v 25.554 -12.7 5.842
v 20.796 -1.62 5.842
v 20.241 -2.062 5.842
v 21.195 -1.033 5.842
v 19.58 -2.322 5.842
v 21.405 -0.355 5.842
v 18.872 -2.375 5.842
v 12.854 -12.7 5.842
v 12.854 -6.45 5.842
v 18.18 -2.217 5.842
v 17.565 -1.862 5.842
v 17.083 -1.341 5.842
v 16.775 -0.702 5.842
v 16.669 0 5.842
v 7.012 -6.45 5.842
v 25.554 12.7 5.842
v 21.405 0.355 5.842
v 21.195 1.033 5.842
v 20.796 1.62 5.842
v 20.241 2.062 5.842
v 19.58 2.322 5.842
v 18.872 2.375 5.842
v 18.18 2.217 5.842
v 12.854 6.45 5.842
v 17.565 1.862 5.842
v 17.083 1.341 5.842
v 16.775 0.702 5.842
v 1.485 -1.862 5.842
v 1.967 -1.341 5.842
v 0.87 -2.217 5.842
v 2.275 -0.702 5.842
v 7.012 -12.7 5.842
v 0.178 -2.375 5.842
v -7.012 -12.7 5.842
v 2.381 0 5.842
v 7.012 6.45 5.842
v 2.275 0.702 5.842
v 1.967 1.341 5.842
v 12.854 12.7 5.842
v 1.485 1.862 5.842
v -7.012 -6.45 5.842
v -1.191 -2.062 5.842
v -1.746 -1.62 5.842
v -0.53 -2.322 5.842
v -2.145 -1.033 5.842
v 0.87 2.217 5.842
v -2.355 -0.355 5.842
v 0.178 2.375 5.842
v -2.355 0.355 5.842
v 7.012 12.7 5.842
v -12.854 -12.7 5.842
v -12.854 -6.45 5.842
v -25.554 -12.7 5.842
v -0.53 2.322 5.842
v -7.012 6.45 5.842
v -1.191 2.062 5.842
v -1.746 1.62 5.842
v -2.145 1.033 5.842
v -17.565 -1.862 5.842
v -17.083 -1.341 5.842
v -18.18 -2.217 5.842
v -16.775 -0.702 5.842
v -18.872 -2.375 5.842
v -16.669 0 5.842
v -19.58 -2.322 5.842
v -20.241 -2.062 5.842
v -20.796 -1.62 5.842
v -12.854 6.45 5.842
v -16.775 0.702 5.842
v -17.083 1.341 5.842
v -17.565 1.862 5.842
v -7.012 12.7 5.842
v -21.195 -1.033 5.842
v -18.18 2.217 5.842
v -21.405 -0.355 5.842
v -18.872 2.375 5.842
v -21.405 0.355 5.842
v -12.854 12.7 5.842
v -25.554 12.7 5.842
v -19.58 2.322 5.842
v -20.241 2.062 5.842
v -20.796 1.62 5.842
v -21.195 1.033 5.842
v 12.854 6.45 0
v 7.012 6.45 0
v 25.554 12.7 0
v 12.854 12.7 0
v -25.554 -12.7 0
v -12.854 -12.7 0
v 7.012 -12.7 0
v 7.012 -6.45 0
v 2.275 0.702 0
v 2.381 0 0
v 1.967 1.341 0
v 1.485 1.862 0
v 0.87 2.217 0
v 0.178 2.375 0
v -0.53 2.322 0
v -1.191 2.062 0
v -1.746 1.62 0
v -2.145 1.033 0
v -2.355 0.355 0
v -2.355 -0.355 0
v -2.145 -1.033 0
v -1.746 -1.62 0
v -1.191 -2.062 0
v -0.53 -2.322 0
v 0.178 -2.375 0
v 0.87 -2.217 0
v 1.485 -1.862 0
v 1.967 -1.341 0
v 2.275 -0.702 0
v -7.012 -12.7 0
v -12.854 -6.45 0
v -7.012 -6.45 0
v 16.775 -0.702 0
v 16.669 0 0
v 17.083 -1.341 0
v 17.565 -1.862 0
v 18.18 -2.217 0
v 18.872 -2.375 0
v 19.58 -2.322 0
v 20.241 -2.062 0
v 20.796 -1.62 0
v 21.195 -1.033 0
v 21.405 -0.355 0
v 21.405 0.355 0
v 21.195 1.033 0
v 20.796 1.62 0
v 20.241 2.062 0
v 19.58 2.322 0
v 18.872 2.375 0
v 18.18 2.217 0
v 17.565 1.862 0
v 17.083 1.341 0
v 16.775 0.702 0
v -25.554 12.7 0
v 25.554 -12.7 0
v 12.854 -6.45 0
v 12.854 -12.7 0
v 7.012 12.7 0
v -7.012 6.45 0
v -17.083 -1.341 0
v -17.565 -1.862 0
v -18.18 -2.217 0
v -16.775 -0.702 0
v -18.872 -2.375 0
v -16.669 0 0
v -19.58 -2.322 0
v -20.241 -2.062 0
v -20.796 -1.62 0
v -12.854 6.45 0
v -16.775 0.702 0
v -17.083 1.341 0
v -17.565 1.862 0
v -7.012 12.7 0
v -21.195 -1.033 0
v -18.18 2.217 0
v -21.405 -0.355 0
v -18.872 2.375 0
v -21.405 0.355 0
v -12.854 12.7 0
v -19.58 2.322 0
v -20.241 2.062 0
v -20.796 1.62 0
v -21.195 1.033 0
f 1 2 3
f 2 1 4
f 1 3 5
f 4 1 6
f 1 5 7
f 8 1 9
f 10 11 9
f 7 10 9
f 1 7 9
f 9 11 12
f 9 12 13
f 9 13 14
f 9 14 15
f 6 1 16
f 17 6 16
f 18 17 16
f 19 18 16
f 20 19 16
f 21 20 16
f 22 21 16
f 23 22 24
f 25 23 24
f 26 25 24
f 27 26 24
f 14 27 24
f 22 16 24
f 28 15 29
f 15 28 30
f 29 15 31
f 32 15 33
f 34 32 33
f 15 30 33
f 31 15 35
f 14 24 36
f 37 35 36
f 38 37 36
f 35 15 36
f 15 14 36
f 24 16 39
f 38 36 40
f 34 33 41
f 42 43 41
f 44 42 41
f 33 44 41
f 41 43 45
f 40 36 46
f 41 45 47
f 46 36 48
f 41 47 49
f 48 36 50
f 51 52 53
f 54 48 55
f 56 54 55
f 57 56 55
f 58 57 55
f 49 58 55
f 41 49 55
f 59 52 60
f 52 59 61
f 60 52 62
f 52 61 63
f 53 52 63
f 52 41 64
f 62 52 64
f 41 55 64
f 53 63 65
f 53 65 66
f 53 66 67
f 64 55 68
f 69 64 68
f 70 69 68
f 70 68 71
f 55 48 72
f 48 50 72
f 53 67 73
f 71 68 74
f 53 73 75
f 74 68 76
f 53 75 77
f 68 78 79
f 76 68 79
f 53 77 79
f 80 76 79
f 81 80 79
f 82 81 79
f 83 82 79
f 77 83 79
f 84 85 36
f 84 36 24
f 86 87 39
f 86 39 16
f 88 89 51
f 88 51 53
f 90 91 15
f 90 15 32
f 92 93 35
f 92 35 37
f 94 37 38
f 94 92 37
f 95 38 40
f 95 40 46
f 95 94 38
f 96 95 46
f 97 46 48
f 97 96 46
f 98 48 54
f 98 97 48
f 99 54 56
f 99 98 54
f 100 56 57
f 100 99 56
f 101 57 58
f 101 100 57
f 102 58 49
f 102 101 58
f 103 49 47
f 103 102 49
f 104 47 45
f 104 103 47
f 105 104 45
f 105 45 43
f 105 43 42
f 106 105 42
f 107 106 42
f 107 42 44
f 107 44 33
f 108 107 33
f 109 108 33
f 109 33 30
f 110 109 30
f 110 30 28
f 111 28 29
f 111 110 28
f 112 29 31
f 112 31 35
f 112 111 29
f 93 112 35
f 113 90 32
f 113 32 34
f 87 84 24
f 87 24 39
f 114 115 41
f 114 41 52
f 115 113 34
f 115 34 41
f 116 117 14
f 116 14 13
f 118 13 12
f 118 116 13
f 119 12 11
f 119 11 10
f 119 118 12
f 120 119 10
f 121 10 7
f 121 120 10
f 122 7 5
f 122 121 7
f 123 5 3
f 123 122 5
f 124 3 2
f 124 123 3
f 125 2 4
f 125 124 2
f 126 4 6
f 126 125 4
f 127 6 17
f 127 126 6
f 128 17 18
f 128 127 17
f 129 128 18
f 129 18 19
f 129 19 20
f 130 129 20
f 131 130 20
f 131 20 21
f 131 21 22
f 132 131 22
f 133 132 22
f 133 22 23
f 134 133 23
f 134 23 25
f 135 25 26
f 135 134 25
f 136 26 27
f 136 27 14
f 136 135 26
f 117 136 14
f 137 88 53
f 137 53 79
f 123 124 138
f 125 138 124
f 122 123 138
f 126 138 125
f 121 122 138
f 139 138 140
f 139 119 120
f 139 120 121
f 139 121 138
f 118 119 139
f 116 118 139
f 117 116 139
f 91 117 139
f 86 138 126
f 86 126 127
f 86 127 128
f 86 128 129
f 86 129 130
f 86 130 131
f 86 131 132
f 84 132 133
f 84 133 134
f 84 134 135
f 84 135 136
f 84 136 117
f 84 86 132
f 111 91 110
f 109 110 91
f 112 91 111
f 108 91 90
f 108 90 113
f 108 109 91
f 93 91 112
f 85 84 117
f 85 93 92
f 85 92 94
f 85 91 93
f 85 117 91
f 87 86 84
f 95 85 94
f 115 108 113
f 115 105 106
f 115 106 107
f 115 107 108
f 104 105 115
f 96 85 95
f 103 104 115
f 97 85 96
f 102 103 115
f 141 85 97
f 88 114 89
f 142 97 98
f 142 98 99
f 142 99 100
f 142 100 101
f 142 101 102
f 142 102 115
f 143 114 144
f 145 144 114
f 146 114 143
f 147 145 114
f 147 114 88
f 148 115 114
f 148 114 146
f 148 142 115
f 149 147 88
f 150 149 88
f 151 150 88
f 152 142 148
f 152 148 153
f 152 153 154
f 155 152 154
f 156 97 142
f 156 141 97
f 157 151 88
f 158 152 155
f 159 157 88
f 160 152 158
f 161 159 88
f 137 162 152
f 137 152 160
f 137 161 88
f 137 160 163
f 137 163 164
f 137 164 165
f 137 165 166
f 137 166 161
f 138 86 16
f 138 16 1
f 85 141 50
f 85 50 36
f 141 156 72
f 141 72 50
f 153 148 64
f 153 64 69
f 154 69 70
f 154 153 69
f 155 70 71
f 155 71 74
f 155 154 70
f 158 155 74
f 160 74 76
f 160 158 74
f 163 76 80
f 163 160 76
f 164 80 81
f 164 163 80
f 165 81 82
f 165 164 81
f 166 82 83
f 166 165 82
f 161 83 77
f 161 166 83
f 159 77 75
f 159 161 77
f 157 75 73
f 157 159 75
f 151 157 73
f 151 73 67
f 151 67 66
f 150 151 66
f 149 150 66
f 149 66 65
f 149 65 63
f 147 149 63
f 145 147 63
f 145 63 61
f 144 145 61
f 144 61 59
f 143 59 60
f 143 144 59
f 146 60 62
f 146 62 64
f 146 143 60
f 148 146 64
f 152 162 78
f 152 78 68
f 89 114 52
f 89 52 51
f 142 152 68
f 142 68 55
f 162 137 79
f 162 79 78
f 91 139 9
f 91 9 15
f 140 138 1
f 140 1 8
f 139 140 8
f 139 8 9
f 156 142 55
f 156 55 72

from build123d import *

# Parameters (mm, degrees)
SKETCH1_R           = 2.38125
BOSS_EXTRUDE1_DEPTH = 5.842


with BuildPart() as part:
    # Sketch1 → Boss-Extrude1 (new body)
    with BuildSketch(Plane.XY):
        Polygon((25.5540002, -12.7), (12.8540002, -12.7), (12.8540002, -6.45), (7.0120002, -6.45), (7.0120002, -12.7), (-7.0120002, -12.7), (-7.0120002, -6.45), (-12.8540002, -6.45), (-12.8540002, -12.7), (-25.5540002, -12.7), (-25.5540002, 12.7), (-12.8540002, 12.7), (-12.8540002, 6.45), (-7.0120002, 6.45), (-7.0120002, 12.7), (7.0120002, 12.7), (7.0120002, 6.45), (12.8540002, 6.45), (12.8540002, 12.7), (25.5540002, 12.7), align=None)
        Circle(SKETCH1_R, mode=Mode.SUBTRACT)
        with Locations((-19.05, 0)):
            Circle(SKETCH1_R, mode=Mode.SUBTRACT)
        with Locations(Location((19.05, 0, 0), (0, 0, 180))):
            Circle(SKETCH1_R, mode=Mode.SUBTRACT)
    extrude(amount=BOSS_EXTRUDE1_DEPTH)


solid = part.part
